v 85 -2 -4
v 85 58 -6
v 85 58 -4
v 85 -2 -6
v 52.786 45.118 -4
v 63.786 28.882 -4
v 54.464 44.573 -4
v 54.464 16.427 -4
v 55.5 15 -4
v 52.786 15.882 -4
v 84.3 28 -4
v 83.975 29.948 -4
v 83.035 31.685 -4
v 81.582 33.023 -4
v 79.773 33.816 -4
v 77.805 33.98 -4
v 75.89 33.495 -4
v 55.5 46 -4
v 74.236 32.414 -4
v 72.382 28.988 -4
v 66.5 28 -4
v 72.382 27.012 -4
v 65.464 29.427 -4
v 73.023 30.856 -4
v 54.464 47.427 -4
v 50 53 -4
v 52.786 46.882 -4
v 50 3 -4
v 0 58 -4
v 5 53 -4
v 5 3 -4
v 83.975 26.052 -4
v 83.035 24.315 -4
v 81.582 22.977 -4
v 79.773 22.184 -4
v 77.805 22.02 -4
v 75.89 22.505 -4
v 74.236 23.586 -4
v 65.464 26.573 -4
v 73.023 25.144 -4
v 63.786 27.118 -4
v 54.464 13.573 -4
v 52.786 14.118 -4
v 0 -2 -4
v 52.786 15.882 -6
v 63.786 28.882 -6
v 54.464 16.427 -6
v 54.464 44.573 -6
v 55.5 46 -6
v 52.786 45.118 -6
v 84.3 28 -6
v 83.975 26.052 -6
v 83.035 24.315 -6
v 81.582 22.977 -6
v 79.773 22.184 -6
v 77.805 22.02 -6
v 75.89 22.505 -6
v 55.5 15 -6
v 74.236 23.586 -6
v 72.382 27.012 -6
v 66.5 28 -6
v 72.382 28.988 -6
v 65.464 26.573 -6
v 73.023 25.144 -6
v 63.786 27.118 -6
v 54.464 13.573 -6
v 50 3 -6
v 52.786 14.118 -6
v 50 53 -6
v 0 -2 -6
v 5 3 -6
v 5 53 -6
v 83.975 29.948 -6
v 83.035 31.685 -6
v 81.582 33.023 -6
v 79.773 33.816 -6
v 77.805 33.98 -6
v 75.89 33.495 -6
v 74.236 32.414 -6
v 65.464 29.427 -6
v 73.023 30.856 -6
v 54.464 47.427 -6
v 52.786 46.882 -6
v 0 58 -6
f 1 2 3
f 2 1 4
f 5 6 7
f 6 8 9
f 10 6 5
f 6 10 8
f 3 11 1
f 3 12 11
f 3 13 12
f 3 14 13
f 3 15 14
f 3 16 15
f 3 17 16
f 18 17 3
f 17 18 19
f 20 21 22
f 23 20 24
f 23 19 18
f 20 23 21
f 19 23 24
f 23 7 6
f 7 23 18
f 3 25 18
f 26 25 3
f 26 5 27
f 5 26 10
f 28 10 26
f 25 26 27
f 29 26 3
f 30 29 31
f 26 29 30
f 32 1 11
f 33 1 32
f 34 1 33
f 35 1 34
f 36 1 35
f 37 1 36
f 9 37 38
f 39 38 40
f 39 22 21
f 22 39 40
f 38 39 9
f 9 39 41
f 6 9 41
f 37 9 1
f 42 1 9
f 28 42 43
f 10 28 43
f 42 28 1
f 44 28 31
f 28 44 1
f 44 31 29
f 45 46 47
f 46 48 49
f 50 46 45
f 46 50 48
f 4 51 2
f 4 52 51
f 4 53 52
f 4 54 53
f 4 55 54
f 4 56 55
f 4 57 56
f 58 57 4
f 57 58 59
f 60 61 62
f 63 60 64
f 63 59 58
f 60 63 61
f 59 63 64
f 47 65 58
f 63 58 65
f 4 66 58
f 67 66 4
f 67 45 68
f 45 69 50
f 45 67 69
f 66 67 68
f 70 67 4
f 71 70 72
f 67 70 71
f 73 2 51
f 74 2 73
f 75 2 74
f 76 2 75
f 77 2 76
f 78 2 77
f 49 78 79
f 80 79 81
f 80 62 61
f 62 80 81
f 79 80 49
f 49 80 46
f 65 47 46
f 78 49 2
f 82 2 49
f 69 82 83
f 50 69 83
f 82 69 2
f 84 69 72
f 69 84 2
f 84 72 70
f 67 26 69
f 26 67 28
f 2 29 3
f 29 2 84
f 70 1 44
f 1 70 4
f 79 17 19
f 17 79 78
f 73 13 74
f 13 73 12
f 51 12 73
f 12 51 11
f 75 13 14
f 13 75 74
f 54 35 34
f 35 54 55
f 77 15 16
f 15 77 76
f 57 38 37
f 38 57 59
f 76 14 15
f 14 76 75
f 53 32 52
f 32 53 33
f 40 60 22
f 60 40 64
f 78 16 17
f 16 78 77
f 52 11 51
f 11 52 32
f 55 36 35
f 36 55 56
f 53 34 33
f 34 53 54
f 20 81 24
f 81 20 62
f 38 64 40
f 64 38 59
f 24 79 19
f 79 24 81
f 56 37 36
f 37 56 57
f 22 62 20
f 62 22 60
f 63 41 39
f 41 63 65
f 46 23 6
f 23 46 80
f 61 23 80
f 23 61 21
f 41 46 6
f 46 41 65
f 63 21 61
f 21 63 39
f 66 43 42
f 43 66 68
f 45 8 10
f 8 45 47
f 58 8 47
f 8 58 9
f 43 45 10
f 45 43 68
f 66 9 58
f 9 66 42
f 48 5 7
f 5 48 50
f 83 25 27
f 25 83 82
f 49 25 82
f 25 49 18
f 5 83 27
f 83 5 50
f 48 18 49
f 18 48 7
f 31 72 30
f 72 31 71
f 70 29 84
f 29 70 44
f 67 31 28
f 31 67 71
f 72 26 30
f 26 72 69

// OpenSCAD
small = 0.1;
peg_bite  =  1.0;
bite_extra = 0.2;  // extra clearance for edge of board
peg_gap   =  2.0;
peg_width =  5.0;
peg_depth =  3.0;
peg_sep   =  56 - 2;
peg_raise =  4.0;

board_x = 85.0;
board_y = 56.0;
board_z =  1.1;

//   _
//  | \
//  |  \
//  |   \
//  |  /
//  |  |
//  |  o-|  <- origin
//  |    |
//  |    |
//  ------
module peg()
{
  extra = 1;

  translate([0, -peg_depth+peg_bite,-peg_raise])
  {
    cube([peg_width,peg_depth,peg_raise], center=false);
  }

  translate([0, -peg_depth+peg_bite,0])
  {
    cube([peg_width,peg_depth-peg_bite-bite_extra,peg_gap+peg_bite+peg_bite], center=false);
  }

  translate([0,-peg_depth+peg_bite+extra-extra,peg_gap])
  {
    //cube([peg_width,peg_depth-peg_bite-extra,peg_bite+extra], center=false);
  }

  peg_dxy = peg_depth;
  polyhedron(
    points = [
      [0, peg_bite, peg_gap+peg_bite],
      [0, peg_bite-peg_dxy, peg_gap+peg_bite-peg_dxy],
      [0, peg_bite-peg_dxy, peg_gap+peg_bite+peg_dxy],
      [peg_width, peg_bite, peg_gap+peg_bite],
      [peg_width, peg_bite-peg_dxy, peg_gap+peg_bite-peg_dxy],
      [peg_width, peg_bite-peg_dxy, peg_gap+peg_bite+peg_dxy],
    ],
    triangles = [ 
      [0,2,1],  // right
      [3,4,5],  // left
      [0,3,2],  // top
      [2,3,5],
      [1,2,4],  // back
      [4,2,5],
      [0,1,3],  // bottom
      [3,1,4]
    ]
  );
}

module front_peg(x)
{
  translate([x,0,0]) 
  {
    peg();
  }
}

module back_peg(x)
{
  translate([x,board_y,0])
  {
    mirror([0,1,0])
    {
      peg();
    }
  }
}


module board()
{
  color([0,1,0]) {
    cube([board_x,board_y,board_z],center=false);
  }
  // ethernet block
  large = 10;
  translate([-1,38,board_z]) 
  {
    cube([21,16.5,14.0]);
    translate([-10.0+small,0,0]) cube([10.0,16.5,14]);  // clearance volume - keep clear
    translate([-10.0,0,0]) cube([10.0+large,16.5,15+2]);  // extra clearance above to height of usb
  }

  // usb block
  translate([0,18,board_z]) 
  {
    translate([-7.5,0,1]) cube([18,14,16]);
    translate([-3,2,0]) cube([13,10,1+small]);
  }

  // hdmi block
  translate([board_x-5.0,44.0,board_z])
  {
    cube([6.0,9.0,4.0]);
    translate([6.0-small,0,0]) cube([10.0,9.0,4.0]);  // clearance volume - keep clear
  }

  // SD Card clearance
  translate([board_x-small,14.0,-3.5])
  {
    difference()
    {
      cube([17.0+small, 25.0, 3.0]);  // clearance volume - keep clear
      translate([-small,10.0,-small]) cube([17.0+small*3,5.0,3+small*2]);
    }
  }

  // audio connector
  translate([13.5, 0, 4.4]) {
    cube([12.0,11.0, 6.5]);
    translate([6.0,0.0,3.25]) rotate([90,0,0]) cylinder(h=4, r=6.5/2);
    translate([6.0,-4+small,3.25]) rotate([90,0,0]) cylinder(h=10, r=6.5/2);  // clearance volume
  }

  // video connector
  translate([33.0,3.0,board_z]) {
    cube([10.0,10.0,13.0]);
    translate([5,0,7.5]) rotate([90,0,0]) cylinder(h=9,r=8.5/2);
    translate([5,0,7.5]) rotate([90,0,0]) cylinder(h=19,r=10.0/2);
  }
}

module pair()
{
  foot_height = 2.0;
  foot_x = peg_width;
  foot_y = board_y + (peg_depth-peg_bite) * 2;
  translate([0,-peg_depth+peg_bite,-peg_raise-foot_height])
  {
    cube([foot_x,foot_y,foot_height],center=false);
  }
}

rh = 6;
bs = 0.7;

module pibase()
{
  //front_peg(3.0);
  //back_peg(3.0);
  //front_peg(board_x-peg_width-3.0);
  //back_peg(board_x-peg_width-3.0);

  pair();
  translate([board_x-7*peg_width,0,0])
  {
    	difference(){
			scale([7,1,1]) pair();
			translate([+7*peg_width-rh-bs,board_y/2,-10])cylinder(h=50,r=rh);
			translate([7*peg_width-20,board_y/2,-10])cylinder(h=50,r=1.5);
			translate([7*peg_width-31,board_y/2-13,-10])cylinder(h=50,r=1.5);
			translate([7*peg_width-31,board_y/2+18,-10])cylinder(h=50,r=1.5);

		}
  }

  // more pegs

  //front_peg(25.0);
  //front_peg(board_x-25.0-peg_width);
  //back_peg(25.0);
  //back_peg(board_x-25.0-peg_width);


  peg3_offet = 25.0;
  
  
  spar_width = peg_width;
  spar_height = 2.0;
  translate([0,-peg_depth+peg_bite,-peg_raise-spar_height]) {
    cube([board_x, spar_width, spar_height]);
  }
  translate([0,board_y-spar_width+peg_depth-peg_bite,-peg_raise-spar_height]) {
    cube([board_x, spar_width, spar_height]);
  }
}

pibase();
//%board();
